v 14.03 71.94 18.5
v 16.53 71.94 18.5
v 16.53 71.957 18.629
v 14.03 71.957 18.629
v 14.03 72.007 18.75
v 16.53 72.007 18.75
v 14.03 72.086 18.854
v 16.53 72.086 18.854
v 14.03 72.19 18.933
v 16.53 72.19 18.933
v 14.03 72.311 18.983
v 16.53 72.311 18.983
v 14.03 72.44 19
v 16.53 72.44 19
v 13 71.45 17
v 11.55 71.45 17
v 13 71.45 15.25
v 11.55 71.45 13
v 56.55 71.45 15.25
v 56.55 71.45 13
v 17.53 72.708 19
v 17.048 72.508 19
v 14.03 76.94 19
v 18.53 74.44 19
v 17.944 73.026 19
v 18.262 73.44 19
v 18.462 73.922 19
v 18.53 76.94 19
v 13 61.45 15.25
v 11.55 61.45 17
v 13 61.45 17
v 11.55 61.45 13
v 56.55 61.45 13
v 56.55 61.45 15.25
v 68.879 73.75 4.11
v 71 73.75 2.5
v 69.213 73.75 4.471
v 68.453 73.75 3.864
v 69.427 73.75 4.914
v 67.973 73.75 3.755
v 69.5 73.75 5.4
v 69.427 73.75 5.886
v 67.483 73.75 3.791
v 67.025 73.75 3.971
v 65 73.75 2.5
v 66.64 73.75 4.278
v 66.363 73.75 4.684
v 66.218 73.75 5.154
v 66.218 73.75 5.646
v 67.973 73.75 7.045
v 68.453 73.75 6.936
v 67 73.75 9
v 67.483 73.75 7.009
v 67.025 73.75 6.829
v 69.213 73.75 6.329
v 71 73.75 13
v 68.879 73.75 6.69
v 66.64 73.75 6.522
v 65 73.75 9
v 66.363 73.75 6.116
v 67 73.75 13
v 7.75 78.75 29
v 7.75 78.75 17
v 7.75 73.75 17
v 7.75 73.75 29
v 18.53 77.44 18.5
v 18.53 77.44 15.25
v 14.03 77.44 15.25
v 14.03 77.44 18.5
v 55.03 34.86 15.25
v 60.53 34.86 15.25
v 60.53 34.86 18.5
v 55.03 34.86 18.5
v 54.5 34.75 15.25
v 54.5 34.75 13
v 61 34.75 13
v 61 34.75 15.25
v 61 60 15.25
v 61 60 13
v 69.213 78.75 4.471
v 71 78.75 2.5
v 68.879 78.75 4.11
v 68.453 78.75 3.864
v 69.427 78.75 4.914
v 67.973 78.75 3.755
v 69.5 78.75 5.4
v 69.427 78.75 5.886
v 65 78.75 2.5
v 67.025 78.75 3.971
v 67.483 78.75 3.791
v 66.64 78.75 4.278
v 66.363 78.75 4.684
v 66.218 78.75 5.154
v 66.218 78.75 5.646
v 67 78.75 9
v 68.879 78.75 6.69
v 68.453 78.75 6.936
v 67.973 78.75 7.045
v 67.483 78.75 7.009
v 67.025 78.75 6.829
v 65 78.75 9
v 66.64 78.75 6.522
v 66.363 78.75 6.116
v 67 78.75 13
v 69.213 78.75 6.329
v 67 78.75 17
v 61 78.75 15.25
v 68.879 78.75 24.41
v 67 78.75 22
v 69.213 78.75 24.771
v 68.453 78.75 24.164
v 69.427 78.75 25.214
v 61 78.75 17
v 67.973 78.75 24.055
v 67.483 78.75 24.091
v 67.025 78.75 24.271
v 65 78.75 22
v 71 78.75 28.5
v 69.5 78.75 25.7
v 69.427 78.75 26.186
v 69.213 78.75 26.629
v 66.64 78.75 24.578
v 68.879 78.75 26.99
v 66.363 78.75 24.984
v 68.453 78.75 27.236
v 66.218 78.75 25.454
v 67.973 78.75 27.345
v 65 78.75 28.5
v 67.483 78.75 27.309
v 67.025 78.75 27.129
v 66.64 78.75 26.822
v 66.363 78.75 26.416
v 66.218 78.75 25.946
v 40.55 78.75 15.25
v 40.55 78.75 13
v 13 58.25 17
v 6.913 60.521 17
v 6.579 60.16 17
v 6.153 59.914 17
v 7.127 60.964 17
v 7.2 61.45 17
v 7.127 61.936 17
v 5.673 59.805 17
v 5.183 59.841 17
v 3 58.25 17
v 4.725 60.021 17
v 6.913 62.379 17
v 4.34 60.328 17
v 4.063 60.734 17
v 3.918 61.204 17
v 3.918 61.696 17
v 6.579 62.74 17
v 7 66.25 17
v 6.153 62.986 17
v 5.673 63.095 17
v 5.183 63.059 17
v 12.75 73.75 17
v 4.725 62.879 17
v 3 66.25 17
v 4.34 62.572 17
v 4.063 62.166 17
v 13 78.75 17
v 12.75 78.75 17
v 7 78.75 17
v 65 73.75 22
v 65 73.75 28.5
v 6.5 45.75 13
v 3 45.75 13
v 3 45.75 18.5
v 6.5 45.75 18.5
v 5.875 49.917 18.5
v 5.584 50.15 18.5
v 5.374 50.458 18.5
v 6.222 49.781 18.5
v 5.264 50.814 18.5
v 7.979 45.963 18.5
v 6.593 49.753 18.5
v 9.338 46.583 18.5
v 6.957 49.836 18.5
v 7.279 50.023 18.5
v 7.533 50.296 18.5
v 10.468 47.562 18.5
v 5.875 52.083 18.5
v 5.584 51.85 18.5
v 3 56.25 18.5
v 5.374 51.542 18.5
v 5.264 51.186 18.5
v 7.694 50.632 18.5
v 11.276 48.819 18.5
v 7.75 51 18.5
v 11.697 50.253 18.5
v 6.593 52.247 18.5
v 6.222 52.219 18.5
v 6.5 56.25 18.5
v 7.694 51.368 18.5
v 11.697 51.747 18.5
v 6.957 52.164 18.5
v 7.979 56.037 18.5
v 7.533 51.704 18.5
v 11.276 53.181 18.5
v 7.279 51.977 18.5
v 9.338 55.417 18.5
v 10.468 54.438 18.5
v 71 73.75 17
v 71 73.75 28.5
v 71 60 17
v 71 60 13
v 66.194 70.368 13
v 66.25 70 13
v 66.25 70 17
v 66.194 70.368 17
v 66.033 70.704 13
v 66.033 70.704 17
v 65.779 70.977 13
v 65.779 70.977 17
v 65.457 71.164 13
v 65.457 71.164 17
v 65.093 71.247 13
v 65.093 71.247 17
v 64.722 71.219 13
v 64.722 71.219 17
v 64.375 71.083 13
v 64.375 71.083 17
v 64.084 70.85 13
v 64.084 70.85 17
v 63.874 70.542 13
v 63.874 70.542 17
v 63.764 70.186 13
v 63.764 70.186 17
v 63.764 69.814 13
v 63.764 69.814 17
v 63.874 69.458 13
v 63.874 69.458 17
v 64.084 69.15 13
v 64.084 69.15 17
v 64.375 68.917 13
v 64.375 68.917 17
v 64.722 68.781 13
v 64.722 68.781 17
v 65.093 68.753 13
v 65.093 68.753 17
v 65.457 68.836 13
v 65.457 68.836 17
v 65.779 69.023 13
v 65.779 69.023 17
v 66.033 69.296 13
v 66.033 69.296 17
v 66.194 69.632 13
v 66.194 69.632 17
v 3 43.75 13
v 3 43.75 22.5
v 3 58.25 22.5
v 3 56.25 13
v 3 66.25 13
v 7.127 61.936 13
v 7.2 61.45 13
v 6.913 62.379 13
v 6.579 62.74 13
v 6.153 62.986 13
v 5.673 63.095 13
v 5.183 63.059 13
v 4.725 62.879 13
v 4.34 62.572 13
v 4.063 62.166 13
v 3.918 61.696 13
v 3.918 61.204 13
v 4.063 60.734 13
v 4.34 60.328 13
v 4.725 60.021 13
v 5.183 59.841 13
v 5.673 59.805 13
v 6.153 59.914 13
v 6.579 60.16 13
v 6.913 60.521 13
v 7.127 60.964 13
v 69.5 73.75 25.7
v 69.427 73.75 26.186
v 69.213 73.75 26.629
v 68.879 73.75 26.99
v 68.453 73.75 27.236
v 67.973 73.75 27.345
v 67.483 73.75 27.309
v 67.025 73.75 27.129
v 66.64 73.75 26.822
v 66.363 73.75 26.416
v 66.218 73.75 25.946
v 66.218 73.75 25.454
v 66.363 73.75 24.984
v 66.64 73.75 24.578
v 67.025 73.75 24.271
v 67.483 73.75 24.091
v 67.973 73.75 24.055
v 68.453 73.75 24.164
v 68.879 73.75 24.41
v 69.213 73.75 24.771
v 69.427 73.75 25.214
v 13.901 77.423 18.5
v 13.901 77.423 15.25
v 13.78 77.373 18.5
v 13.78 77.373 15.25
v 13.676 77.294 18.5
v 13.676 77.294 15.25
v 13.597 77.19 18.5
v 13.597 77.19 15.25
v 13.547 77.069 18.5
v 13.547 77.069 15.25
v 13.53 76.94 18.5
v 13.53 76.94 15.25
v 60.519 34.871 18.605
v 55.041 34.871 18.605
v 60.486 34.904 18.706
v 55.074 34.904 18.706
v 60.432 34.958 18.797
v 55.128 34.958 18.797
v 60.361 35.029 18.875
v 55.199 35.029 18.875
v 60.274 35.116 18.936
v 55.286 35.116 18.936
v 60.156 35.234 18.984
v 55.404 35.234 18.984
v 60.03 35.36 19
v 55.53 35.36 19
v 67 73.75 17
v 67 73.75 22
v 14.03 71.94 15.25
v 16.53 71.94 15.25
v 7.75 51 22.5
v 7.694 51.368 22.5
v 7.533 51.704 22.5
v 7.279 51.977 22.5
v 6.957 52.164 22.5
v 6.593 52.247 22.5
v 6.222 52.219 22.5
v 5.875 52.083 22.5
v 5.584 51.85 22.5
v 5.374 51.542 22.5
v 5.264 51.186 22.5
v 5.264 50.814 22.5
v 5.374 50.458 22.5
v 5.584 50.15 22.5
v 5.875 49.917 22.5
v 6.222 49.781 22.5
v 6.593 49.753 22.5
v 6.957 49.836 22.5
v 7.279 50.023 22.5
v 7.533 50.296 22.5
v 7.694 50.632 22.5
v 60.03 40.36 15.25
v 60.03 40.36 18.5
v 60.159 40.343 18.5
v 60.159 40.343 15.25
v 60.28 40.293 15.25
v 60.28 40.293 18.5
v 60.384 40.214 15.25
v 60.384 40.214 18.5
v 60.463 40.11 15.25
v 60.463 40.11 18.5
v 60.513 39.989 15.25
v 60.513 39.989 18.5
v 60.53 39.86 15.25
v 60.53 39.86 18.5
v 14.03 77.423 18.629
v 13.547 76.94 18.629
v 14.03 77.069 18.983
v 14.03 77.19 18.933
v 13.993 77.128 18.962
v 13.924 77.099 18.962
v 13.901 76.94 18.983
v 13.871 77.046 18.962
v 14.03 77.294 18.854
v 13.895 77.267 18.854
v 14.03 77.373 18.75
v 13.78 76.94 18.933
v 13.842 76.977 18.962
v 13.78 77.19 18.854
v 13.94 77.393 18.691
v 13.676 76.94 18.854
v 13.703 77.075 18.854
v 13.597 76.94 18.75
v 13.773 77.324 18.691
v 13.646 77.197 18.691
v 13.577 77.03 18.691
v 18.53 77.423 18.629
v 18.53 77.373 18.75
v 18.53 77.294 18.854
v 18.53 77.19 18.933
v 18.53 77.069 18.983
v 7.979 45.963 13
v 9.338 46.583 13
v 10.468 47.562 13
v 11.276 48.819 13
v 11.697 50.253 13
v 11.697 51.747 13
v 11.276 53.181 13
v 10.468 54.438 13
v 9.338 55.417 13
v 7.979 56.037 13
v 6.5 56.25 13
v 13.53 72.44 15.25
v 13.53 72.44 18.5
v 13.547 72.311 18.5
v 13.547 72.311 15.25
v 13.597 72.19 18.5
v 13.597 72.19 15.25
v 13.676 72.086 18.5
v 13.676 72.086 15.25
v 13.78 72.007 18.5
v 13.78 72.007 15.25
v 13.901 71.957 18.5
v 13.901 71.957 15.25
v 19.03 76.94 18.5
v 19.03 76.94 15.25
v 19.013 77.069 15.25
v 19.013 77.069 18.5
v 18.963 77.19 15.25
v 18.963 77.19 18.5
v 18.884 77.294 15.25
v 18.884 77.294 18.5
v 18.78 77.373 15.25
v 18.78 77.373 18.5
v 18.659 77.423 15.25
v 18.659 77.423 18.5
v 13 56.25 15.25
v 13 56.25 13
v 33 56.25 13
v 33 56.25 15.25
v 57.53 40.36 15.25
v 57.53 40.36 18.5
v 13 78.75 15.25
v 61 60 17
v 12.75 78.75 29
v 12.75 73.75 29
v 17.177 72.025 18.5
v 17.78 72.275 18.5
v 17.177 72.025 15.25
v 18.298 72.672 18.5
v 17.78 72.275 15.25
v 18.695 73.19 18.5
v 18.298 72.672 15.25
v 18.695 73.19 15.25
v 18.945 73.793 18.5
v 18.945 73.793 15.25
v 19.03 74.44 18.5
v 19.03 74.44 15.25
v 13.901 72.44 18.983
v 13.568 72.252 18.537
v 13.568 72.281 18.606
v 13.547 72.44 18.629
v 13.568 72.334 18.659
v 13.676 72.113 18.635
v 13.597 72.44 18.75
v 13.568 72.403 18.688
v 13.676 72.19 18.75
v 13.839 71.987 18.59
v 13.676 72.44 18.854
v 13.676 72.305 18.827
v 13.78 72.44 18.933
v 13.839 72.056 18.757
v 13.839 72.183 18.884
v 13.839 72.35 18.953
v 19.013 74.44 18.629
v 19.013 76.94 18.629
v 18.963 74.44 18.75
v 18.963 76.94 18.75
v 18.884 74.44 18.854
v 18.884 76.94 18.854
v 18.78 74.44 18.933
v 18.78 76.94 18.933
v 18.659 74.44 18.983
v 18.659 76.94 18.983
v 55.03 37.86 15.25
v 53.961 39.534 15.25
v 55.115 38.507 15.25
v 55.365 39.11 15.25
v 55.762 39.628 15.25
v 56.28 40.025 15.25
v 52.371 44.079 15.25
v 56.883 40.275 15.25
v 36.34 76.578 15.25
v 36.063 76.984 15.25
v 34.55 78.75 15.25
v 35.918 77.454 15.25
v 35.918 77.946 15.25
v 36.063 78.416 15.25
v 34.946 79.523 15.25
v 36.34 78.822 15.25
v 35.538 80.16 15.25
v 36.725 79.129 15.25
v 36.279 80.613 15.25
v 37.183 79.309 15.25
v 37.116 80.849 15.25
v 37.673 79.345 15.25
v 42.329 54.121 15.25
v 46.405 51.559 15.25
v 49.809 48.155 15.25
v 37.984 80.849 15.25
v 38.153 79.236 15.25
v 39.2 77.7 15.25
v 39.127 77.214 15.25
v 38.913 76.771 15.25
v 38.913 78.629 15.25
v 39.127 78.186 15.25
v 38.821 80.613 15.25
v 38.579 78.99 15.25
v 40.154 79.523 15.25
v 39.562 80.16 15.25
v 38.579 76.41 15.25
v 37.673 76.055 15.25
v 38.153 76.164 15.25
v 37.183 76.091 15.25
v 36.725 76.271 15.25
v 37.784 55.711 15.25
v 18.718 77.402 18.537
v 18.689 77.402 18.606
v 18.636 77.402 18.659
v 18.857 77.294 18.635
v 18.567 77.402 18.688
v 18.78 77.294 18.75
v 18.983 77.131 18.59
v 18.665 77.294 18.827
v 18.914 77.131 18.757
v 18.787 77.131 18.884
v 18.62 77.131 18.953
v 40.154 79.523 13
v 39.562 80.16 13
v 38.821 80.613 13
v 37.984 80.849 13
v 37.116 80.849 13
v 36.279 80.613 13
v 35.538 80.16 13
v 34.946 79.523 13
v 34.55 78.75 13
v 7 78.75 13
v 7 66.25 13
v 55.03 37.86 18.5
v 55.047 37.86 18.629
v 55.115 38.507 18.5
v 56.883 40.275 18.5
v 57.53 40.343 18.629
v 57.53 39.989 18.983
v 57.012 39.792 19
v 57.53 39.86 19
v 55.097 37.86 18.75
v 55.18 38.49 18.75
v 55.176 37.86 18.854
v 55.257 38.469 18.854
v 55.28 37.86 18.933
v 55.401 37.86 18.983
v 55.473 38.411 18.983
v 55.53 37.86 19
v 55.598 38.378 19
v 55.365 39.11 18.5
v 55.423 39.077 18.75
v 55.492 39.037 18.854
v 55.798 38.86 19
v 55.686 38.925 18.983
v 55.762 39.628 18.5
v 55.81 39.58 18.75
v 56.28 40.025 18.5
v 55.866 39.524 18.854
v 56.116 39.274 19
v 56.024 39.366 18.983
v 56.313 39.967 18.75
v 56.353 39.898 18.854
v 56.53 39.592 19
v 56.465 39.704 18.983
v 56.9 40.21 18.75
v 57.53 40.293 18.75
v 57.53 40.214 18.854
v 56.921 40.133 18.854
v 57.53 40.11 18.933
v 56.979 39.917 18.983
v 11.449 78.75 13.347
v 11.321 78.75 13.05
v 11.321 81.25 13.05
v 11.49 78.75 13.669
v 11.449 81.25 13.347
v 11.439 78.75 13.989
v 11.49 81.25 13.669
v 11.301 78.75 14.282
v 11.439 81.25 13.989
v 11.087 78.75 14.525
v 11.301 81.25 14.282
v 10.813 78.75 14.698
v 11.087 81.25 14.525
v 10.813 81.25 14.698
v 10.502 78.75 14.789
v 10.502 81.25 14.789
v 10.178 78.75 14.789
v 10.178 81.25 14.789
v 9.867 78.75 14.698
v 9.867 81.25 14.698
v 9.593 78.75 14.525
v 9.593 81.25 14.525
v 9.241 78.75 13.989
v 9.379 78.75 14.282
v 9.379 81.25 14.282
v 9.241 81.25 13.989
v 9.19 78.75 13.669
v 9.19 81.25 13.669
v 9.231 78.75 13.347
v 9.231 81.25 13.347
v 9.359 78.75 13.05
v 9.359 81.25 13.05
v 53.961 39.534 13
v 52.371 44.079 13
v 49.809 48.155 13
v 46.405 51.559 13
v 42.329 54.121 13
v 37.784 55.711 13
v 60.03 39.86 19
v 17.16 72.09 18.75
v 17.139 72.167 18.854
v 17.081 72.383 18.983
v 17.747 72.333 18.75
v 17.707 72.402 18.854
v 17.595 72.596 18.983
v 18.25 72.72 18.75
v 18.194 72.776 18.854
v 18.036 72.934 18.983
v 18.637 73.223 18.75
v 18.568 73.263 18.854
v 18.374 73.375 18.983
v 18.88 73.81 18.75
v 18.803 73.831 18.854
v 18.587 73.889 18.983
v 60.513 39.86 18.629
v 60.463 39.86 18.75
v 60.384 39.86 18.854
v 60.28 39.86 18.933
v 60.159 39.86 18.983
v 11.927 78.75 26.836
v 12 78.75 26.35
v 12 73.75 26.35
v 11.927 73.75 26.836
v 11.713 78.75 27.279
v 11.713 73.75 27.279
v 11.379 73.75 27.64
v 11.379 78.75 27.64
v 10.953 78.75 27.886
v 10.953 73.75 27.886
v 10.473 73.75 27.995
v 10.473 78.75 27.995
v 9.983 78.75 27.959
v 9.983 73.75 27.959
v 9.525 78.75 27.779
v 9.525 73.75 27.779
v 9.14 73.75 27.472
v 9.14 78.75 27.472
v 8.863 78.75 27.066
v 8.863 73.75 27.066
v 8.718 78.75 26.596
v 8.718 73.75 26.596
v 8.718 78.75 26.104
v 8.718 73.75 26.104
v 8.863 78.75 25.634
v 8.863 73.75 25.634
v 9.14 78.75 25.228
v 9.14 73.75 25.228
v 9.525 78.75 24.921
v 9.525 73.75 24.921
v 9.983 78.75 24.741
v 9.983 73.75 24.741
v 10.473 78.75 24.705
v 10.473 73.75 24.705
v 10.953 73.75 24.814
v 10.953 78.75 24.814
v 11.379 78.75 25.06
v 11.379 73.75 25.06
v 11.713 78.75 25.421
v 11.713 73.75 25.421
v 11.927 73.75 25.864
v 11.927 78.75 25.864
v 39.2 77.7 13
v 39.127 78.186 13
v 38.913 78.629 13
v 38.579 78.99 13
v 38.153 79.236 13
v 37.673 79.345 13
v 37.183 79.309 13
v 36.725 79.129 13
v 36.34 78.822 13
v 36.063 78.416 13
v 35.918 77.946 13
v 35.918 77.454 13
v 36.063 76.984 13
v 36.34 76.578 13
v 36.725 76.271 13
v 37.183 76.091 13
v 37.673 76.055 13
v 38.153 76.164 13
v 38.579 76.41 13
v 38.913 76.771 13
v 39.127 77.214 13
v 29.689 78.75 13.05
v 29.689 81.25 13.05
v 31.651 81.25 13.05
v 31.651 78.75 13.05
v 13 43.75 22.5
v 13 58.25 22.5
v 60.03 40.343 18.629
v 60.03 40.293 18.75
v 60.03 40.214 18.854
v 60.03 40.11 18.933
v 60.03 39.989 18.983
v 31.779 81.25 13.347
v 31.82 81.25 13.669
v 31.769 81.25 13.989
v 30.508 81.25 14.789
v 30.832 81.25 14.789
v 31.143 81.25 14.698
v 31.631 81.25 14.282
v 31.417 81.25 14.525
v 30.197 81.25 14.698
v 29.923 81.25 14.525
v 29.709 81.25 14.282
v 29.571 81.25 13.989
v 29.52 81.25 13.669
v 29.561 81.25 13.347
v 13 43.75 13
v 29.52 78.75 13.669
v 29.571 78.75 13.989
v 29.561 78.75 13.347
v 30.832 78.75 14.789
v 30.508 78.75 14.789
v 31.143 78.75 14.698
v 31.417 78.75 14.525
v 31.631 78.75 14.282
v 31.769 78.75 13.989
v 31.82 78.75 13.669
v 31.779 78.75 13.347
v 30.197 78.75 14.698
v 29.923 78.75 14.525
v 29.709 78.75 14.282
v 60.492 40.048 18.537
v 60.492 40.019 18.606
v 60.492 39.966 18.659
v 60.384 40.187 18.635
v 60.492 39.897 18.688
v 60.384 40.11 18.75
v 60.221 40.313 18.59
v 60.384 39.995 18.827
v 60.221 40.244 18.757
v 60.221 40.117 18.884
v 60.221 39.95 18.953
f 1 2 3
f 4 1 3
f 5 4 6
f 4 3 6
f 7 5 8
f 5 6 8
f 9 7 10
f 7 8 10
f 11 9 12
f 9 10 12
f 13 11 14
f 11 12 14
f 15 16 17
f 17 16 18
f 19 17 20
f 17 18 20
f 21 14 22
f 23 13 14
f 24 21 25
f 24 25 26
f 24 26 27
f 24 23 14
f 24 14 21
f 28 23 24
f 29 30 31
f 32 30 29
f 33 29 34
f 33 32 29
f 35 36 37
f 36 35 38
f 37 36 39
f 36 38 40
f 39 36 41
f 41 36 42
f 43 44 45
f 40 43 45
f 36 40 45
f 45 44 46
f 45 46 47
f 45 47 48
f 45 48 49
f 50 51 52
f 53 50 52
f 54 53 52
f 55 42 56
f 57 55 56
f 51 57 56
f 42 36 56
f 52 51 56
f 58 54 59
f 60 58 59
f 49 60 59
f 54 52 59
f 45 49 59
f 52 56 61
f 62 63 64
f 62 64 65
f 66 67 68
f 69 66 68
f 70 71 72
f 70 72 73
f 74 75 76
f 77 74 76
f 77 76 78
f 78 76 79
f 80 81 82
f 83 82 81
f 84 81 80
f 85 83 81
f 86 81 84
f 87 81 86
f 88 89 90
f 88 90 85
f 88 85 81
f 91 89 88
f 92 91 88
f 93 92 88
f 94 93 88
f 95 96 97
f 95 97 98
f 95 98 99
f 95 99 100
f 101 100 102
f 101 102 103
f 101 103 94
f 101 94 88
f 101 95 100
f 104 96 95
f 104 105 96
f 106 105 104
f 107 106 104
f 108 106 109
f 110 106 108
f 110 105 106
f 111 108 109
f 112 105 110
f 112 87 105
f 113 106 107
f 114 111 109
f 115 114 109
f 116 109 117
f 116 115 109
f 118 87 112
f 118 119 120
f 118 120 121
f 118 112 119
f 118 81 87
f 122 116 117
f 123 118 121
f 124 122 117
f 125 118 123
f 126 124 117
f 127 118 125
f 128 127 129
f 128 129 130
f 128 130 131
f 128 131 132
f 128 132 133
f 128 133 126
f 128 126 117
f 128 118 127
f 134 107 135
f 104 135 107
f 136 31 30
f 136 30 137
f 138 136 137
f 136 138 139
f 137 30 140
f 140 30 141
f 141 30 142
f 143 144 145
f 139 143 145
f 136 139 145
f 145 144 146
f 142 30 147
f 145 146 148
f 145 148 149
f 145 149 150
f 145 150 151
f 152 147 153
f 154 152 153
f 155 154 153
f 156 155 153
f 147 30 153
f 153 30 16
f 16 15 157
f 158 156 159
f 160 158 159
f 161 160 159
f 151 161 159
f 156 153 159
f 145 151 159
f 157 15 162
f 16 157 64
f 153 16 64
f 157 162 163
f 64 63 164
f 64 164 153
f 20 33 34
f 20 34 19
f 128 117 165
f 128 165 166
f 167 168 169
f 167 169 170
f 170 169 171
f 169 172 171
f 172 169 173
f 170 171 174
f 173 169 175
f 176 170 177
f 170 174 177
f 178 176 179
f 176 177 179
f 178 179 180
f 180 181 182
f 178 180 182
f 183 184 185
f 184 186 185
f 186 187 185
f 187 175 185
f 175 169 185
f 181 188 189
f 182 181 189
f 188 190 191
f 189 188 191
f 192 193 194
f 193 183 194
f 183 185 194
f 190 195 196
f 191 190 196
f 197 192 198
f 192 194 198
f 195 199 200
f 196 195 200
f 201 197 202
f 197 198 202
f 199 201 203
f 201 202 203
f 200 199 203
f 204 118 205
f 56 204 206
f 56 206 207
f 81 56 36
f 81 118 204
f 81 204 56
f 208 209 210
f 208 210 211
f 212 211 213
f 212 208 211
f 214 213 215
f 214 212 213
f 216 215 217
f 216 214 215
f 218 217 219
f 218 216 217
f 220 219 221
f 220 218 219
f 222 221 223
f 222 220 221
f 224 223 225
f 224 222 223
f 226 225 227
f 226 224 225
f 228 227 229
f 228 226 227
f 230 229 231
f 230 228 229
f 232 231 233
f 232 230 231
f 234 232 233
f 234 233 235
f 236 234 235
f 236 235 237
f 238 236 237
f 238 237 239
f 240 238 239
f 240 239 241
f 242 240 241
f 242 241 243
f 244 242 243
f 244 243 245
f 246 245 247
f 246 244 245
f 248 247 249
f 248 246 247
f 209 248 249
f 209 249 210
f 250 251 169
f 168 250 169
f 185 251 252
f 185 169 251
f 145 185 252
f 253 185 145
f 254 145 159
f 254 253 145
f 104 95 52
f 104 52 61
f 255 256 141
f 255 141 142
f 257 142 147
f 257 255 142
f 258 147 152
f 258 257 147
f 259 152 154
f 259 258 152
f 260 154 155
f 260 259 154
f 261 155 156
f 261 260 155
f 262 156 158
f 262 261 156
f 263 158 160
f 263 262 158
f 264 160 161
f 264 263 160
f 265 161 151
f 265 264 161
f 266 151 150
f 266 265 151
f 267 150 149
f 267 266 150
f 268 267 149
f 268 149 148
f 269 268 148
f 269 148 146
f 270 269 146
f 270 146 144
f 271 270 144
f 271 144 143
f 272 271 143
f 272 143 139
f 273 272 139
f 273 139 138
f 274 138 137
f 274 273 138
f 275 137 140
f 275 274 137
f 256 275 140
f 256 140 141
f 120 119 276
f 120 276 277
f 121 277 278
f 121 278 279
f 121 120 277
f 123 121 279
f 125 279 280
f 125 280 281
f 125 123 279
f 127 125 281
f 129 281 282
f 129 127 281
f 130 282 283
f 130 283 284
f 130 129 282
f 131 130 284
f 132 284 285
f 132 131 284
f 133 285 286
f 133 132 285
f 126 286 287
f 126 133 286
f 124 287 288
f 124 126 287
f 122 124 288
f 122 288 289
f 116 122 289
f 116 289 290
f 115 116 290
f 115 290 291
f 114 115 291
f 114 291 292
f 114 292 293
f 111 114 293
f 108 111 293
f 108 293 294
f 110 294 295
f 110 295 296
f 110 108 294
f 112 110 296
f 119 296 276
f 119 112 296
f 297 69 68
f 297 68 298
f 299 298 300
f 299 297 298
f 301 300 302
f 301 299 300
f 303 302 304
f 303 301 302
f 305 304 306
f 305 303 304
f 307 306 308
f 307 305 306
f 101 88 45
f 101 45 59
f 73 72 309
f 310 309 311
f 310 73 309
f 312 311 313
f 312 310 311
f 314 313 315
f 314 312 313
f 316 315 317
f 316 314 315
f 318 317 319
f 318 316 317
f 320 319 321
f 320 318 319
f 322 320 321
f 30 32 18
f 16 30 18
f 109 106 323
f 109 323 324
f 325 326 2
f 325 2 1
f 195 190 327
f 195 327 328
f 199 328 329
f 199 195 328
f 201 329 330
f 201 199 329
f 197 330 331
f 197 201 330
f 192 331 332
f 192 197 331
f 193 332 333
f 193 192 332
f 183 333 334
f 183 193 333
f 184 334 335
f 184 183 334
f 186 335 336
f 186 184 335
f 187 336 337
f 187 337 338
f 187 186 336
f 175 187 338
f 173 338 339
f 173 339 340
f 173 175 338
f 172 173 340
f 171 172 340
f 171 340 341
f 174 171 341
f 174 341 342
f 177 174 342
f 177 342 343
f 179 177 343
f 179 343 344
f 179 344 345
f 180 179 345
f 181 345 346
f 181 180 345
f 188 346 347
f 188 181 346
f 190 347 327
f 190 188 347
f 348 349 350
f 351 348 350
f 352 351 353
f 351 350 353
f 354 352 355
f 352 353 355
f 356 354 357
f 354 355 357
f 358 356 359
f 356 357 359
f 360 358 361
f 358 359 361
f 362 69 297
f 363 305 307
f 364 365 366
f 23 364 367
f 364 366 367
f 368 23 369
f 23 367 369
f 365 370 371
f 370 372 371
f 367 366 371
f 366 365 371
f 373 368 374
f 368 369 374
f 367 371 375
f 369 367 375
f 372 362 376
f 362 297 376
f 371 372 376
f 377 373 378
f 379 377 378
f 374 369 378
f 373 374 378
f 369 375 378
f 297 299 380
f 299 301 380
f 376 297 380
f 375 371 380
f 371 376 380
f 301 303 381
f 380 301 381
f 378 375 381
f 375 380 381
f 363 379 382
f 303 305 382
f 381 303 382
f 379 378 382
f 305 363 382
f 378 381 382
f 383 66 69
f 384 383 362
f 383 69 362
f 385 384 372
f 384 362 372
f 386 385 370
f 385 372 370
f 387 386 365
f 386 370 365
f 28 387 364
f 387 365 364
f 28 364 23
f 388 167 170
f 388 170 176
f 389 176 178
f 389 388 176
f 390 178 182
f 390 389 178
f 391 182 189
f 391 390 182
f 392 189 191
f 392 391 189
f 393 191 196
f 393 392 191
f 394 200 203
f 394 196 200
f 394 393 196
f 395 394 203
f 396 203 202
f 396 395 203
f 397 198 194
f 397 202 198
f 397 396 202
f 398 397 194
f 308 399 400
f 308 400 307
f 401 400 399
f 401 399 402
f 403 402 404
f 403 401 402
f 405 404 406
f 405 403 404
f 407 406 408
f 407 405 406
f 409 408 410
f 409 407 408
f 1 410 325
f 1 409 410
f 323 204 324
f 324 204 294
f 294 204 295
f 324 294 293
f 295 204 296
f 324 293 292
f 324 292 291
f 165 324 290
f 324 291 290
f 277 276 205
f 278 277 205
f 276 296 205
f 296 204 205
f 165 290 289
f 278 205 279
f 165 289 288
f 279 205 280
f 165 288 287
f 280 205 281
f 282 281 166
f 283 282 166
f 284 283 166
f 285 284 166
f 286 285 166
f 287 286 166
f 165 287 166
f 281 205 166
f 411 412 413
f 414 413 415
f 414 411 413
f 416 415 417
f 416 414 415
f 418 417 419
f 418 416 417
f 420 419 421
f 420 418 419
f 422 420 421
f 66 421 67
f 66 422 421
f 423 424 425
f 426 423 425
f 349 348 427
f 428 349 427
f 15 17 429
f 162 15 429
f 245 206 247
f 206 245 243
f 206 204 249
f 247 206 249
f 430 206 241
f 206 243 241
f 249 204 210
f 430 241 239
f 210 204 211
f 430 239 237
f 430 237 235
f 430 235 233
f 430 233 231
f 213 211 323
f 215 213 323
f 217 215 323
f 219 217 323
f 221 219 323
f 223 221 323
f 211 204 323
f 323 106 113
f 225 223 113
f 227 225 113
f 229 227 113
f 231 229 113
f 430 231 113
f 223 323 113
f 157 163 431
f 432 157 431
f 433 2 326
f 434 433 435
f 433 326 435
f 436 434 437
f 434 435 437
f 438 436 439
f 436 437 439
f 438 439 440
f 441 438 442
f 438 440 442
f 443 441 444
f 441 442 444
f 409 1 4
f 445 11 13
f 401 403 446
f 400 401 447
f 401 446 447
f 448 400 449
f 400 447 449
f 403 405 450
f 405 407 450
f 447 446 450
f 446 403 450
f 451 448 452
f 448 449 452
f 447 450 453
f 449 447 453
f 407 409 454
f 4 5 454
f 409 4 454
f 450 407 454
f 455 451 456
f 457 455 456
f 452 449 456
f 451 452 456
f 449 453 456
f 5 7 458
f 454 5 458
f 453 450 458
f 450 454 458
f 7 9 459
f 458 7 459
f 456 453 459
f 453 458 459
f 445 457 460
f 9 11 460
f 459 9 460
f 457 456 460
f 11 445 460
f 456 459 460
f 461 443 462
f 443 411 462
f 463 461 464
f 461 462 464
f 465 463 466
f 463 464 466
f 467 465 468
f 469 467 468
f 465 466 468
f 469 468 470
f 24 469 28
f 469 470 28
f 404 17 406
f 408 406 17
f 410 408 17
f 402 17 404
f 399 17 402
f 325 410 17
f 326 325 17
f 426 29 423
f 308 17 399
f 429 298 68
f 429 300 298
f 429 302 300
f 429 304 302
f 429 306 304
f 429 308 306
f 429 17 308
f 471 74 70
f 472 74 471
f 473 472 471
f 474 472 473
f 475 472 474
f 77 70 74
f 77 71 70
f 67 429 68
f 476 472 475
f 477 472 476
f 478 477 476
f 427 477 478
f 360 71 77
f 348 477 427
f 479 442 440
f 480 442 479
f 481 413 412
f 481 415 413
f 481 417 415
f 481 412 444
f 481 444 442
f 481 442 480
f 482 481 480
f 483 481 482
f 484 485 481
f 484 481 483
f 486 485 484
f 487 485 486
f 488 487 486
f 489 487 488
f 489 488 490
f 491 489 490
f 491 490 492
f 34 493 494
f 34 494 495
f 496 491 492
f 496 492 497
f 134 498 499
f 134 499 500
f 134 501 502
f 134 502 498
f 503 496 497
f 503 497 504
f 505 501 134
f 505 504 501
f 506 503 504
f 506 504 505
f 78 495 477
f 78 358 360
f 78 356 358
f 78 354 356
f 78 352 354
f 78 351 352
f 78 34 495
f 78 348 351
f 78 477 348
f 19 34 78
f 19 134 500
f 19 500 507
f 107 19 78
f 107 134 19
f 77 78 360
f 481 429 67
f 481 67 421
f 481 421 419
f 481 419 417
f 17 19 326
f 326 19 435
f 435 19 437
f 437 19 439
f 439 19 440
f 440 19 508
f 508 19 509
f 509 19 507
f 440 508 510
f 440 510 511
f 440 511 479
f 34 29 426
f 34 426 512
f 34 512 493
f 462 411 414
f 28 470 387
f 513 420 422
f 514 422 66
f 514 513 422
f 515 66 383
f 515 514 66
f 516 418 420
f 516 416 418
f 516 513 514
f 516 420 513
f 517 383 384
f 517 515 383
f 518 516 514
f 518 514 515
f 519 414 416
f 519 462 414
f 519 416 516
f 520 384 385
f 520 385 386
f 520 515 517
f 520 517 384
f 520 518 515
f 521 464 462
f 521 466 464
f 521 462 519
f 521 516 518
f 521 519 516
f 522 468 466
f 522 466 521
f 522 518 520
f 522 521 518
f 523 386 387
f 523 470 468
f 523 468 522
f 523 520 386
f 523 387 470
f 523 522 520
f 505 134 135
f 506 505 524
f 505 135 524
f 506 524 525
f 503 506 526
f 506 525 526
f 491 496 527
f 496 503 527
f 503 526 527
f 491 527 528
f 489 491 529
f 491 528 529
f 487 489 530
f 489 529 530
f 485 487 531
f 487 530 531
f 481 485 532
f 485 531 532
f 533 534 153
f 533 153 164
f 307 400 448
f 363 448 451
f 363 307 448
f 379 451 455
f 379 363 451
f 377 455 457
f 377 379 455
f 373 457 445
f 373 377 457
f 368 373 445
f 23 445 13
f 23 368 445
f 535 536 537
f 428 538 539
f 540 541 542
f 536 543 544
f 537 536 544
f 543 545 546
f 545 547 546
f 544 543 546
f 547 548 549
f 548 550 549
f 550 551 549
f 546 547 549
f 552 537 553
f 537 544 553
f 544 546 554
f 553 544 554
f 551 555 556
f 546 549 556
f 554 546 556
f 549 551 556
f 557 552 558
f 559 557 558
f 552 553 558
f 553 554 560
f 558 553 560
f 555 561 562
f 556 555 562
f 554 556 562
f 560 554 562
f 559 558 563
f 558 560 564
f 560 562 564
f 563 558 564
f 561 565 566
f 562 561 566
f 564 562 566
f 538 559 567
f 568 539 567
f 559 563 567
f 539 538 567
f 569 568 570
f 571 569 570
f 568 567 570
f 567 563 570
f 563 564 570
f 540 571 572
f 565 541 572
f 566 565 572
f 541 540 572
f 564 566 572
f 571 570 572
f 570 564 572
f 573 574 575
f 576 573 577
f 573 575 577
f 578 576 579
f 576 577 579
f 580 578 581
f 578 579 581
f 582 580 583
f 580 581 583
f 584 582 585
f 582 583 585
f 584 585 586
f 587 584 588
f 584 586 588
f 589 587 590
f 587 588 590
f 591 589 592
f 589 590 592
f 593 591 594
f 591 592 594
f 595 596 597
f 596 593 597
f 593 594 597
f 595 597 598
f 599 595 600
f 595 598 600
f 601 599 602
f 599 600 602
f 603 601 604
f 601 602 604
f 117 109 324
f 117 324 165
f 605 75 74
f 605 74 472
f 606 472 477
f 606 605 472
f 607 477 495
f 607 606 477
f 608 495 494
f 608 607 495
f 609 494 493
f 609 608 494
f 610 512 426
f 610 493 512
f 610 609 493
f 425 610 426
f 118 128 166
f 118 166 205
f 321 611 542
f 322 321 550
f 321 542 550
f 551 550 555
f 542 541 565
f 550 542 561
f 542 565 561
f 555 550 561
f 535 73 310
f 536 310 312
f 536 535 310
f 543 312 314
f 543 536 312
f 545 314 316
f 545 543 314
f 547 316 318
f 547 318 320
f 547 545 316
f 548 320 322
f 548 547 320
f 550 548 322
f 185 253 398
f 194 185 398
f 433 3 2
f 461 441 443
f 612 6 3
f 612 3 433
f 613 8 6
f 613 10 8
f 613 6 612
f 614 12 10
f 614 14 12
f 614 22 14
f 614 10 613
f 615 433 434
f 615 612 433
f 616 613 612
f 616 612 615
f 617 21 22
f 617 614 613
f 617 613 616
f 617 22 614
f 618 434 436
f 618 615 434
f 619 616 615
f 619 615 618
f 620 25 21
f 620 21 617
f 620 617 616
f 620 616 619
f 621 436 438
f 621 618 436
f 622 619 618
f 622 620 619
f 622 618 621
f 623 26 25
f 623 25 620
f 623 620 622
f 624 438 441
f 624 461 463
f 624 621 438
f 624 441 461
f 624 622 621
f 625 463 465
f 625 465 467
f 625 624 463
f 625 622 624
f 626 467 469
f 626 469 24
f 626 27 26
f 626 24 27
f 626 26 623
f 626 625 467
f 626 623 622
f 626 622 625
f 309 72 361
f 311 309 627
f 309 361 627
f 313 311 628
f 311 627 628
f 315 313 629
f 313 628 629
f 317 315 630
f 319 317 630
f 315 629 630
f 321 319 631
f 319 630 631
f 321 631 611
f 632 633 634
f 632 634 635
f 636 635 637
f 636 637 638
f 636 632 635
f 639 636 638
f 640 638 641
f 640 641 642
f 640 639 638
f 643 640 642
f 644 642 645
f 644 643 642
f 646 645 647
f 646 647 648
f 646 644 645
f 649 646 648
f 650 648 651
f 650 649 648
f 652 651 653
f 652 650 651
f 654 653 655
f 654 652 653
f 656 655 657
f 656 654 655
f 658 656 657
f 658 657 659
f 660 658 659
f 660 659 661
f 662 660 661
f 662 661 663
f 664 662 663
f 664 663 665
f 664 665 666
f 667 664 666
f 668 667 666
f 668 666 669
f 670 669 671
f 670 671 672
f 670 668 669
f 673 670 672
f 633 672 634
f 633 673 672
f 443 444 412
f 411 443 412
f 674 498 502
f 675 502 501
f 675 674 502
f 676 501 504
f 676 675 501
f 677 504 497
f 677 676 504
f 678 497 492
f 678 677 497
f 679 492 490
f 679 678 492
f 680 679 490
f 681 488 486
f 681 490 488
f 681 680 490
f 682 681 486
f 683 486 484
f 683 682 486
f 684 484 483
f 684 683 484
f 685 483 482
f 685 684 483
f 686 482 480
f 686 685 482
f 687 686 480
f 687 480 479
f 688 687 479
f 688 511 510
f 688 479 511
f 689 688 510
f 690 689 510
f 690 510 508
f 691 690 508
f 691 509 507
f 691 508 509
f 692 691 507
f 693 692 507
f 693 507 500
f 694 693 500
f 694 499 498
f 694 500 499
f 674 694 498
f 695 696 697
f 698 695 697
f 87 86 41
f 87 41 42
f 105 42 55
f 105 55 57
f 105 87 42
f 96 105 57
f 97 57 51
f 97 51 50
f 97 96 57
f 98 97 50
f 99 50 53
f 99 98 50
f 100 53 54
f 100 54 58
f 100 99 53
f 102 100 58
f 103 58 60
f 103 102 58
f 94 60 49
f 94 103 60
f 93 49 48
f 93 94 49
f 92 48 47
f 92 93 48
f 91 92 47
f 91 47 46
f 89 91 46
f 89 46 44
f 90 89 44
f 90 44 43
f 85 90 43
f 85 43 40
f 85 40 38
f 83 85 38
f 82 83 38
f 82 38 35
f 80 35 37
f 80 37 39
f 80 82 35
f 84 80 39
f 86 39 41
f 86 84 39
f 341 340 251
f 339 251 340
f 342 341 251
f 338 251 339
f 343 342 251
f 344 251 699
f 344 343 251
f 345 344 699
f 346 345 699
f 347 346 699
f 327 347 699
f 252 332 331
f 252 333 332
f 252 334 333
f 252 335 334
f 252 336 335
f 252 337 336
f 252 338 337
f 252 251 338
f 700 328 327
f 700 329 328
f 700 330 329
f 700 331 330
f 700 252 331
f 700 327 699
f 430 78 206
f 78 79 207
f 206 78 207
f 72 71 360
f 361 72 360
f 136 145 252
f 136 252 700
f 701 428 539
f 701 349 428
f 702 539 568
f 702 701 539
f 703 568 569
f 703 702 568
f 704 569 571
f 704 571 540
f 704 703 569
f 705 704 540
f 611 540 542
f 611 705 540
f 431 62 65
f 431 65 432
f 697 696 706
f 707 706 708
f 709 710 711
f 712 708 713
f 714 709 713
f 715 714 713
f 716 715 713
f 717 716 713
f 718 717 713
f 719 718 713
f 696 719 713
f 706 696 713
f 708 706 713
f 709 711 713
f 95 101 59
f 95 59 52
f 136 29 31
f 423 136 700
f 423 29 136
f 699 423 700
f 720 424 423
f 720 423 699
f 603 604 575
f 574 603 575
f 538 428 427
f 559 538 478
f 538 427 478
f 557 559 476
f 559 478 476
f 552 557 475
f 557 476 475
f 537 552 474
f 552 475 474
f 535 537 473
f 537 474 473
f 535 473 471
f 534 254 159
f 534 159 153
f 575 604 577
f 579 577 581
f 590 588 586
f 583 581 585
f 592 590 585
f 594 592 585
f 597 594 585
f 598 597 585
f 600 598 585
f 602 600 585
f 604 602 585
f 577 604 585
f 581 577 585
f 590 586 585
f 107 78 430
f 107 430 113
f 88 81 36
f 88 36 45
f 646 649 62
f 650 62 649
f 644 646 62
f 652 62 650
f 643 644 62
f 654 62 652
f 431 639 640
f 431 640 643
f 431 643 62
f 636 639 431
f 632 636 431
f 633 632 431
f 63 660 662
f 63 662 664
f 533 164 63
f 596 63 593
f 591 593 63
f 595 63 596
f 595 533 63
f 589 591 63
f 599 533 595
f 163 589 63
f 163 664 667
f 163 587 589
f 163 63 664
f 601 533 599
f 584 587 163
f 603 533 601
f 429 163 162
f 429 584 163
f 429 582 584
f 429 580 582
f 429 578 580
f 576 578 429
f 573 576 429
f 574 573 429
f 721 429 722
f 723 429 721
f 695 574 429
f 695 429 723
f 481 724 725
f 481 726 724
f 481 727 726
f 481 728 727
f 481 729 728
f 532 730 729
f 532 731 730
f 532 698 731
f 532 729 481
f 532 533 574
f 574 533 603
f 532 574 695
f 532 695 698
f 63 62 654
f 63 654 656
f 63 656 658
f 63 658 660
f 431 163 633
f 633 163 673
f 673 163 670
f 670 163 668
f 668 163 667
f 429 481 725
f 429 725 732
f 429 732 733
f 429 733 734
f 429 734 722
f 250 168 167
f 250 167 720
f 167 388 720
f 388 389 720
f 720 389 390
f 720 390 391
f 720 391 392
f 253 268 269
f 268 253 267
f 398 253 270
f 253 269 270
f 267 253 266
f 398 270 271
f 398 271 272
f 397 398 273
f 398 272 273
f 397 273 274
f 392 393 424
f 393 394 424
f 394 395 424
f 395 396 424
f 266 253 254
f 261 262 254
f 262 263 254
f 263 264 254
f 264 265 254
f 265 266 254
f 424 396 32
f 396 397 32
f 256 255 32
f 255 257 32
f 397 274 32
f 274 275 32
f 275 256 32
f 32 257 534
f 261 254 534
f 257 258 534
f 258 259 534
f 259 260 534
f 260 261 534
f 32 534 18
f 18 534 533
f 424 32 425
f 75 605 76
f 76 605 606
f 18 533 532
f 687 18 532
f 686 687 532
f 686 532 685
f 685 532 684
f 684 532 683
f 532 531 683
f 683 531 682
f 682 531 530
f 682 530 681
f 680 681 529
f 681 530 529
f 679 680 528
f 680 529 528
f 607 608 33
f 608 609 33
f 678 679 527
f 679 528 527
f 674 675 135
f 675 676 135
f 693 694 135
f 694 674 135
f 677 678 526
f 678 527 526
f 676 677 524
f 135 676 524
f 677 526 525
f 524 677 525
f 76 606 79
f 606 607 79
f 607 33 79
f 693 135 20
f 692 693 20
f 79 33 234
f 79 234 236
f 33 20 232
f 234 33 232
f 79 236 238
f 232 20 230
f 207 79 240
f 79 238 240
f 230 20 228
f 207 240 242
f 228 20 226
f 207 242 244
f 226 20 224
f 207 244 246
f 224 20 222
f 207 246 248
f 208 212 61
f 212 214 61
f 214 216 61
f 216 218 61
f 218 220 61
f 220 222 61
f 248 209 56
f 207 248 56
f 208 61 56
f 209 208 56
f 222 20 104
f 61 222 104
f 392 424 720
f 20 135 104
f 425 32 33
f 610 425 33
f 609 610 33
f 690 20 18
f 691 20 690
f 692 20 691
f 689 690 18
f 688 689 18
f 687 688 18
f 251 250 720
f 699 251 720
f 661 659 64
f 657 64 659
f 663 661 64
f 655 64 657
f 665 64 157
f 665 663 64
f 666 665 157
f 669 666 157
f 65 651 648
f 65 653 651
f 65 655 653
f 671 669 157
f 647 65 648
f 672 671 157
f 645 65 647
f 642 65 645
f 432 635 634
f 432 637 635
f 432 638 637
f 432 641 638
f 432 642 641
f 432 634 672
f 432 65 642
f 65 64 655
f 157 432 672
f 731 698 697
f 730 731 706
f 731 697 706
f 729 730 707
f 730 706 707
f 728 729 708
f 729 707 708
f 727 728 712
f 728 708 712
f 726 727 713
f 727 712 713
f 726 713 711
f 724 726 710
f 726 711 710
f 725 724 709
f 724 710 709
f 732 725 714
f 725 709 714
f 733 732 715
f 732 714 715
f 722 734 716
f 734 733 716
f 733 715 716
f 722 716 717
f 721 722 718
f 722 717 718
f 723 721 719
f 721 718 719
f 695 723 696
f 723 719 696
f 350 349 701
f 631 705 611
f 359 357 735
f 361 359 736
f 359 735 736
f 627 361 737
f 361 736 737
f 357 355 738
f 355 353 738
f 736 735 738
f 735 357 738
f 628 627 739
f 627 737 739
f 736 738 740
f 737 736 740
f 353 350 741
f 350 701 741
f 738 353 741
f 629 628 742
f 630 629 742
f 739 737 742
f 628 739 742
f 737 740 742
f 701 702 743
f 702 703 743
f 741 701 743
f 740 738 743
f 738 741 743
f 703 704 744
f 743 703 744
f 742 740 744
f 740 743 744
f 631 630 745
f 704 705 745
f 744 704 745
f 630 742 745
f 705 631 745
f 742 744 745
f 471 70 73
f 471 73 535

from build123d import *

# Parameters (mm, degrees)
SKETCH021_R      = 1.65
EXTRUDE021_DEPTH = 5
EXTRUDE001_DEPTH = 4
FILLET003_R      = 0.5
BOX005_W         = 48
BOX005_H         = 47
BOX005_DEPTH     = 10
EXTRUDE037_DEPTH = 6
SKETCH038_W      = 10
SKETCH038_H      = 14.5
SKETCH038_R      = 1.25
EXTRUDE038_DEPTH = 4
SKETCH039_W      = 5
SKETCH039_H      = 16
SKETCH039_R      = 1.65
EXTRUDE039_DEPTH = 5
EXTRUDE040_DEPTH = 3
SKETCH020_R      = 1.65
SKETCH020_R_2    = 1.25
SKETCH020_W      = 45
SKETCH020_H      = 10
EXTRUDE036_DEPTH = 4


with BuildPart() as gpshold:
    # Sketch021 → Extrude021 (new body)
    with BuildSketch(Plane.XZ):
        Polygon((65, 28.5), (71, 28.5), (71, 2.5), (65, 2.5), (65, 9), (67, 9), (67, 22), (65, 22), align=None)
        with Locations((67.85, 25.7)):
            Circle(SKETCH021_R, mode=Mode.SUBTRACT)
        with Locations((67.85, 5.4)):
            Circle(SKETCH021_R, mode=Mode.SUBTRACT)
    extrude(amount=EXTRUDE021_DEPTH)


with BuildPart() as gpshold_1:
    # Extrude021 placement: moved
    add(gpshold.part.moved(Location((0, 78.75, 0))))


with BuildPart() as ipsholdbottomindone:
    # Sketch001 → Extrude001 (new body)
    with BuildSketch(Plane.XY):
        with BuildLine():
            Line((19.03, 74.44), (19.03, 77.44))
            Line((19.03, 77.44), (13.53, 77.44))
            Line((13.53, 71.94), (13.53, 77.44))
            Line((16.53, 71.94), (13.53, 71.94))
            ThreePointArc((16.53, 71.94), (18.297767, 72.672233), (19.03, 74.44))
        make_face()
        with BuildLine():
            Line((60.53, 34.86), (55.03, 34.86))
            Line((55.03, 34.86), (55.03, 37.86))
            ThreePointArc((57.53, 40.36), (55.762233, 39.627767), (55.03, 37.86))
            Line((60.53, 40.36), (57.53, 40.36))
            Line((60.53, 34.86), (60.53, 40.36))
        make_face()
    extrude(amount=EXTRUDE001_DEPTH)


with BuildPart() as ipsholdbottomindone_1:
    # Extrude001 placement: moved
    add(ipsholdbottomindone.part.moved(Location((0, 0, 2))))

    # Fillet003
    fillet003_edges = [ipsholdbottomindone_1.edges().sort_by_distance(p)[0] for p in [
        (57.78, 34.86, 6),
        (55.03, 36.36, 6),
        (55.762233, 39.627767, 6),
        (60.53, 40.36, 4),
        (59.03, 40.36, 6),
        (60.53, 37.61, 6),
        (18.297767, 72.672233, 6),
        (19.03, 77.44, 4),
        (19.03, 75.94, 6),
        (13.53, 77.44, 4),
        (16.28, 77.44, 6),
        (13.53, 71.94, 4),
        (13.53, 74.69, 6),
        (15.03, 71.94, 6),
    ]]
    fillet(fillet003_edges, radius=FILLET003_R)


with BuildPart() as ipsholdbottomindone_2:
    # Fillet003 placement: moved
    add(ipsholdbottomindone_1.part.moved(Location((0, 0, 13))))


with BuildPart() as sensorholdipscut:
    # Box005 → Box005 (new body)
    with BuildSketch(Plane(origin=(13, 34, 15.25), x_dir=(1, 0, 0), z_dir=(0, 0, 1))):
        with Locations((24, 23.5)):
            Rectangle(BOX005_W, BOX005_H)
    extrude(amount=BOX005_DEPTH)


with BuildPart() as sensorholdaddon:
    # Sketch037 → Extrude037 (new body)
    with BuildSketch(Plane.XY.offset(17)):
        with BuildLine():
            Line((3, 58.25), (13, 58.25))
            Line((13, 58.25), (13, 43.75))
            Line((13, 43.75), (3, 43.75))
            Line((3, 43.75), (3, 45.75))
            Line((3, 45.75), (6.5, 45.75))
            ThreePointArc((6.5, 45.75), (11.75, 51), (6.5, 56.25))
            Line((3, 56.25), (6.5, 56.25))
            Line((3, 58.25), (3, 56.25))
        make_face()
    extrude(amount=EXTRUDE037_DEPTH)


with BuildPart() as sensorholdaddon_1:
    # Extrude037 placement: moved
    add(sensorholdaddon.part.moved(Location((0, 0, -4))))


with BuildPart() as sensorholdaddon001:
    # Sketch038 → Extrude038 (new body)
    with BuildSketch(Plane.XY.offset(17)):
        with Locations((8, 51)):
            Rectangle(SKETCH038_W, SKETCH038_H)
        with Locations((6.5, 51)):
            Circle(SKETCH038_R, mode=Mode.SUBTRACT)
    extrude(amount=EXTRUDE038_DEPTH)


with BuildPart() as sensorholdaddon001_1:
    # Extrude038 placement: moved
    add(sensorholdaddon001.part.moved(Location((0, 0, 1.5))))


with BuildPart() as bmehold:
    # Sketch039 → Extrude039 (new body)
    with BuildSketch(Plane.XZ.offset(-78.75)):
        with Locations((10.25, 21)):
            Rectangle(SKETCH039_W, SKETCH039_H)
        with Locations((10.35, 26.35)):
            Circle(SKETCH039_R, mode=Mode.SUBTRACT)
    extrude(amount=EXTRUDE039_DEPTH)


with BuildPart() as bmehold001:
    # Sketch040 → Extrude040 (new body)
    with BuildSketch(Plane.XZ.offset(-78.75)):
        with BuildLine():
            ThreePointArc((11.321071, 13.05), (10.34, 14.8), (9.358929, 13.05))
            Line((9.358929, 13.05), (11.321071, 13.05))
        make_face()
        with BuildLine():
            ThreePointArc((31.651071, 13.05), (30.67, 14.8), (29.688929, 13.05))
            Line((29.688929, 13.05), (31.651071, 13.05))
        make_face()
    extrude(amount=EXTRUDE040_DEPTH)


with BuildPart() as bmehold001_1:
    # Extrude040 placement: moved
    add(bmehold001.part.moved(Location((0, 2.5, 0))))


with BuildPart() as sensorhold005:
    # Sketch020 → Extrude036 (new body)
    with BuildSketch(Plane.XY):
        with BuildLine():
            Line((71, 78.75), (71, 60))
            Line((61, 60), (71, 60))
            Line((61, 34.75), (61, 60))
            Line((61, 34.75), (61, 60))
            Line((61, 34.75), (61, 60))
            Line((54.5, 34.75), (61, 34.75))
            ThreePointArc((54.5, 34.75), (48.202796, 49.952796), (33, 56.25))
            Line((3, 56.25), (33, 56.25))
            Line((3, 56.25), (3, 66.25))
            Line((3, 66.25), (7, 66.25))
            Line((7, 66.25), (7, 78.75))
            Line((7, 78.75), (34.55, 78.75))
            ThreePointArc((40.55, 78.75), (37.55, 80.878443), (34.55, 78.75))
            Line((40.55, 78.75), (71, 78.75))
        make_face()
        with Locations((5.55, 61.45)):
            Circle(SKETCH020_R, mode=Mode.SUBTRACT)
        with Locations((37.55, 77.7)):
            Circle(SKETCH020_R, mode=Mode.SUBTRACT)
        with Locations((65, 70)):
            Circle(SKETCH020_R_2, mode=Mode.SUBTRACT)
        with Locations((34.05, 66.45)):
            Rectangle(SKETCH020_W, SKETCH020_H, mode=Mode.SUBTRACT)
    extrude(amount=EXTRUDE036_DEPTH)


with BuildPart() as sensorhold005_1:
    # Extrude036 placement: moved
    add(sensorhold005.part.moved(Location((0, 0, 13))))

    # Fusion034: union sensorHoldAddon, sensorHoldAddon001, bmeHold, bmeHold001
    add(sensorholdaddon_1.part)
    add(sensorholdaddon001_1.part)
    add(bmehold.part)
    add(bmehold001_1.part)

    # Cut016: cut sensorHoldIPSCut
    add(sensorholdipscut.part, mode=Mode.SUBTRACT)

    # Fusion035: union ipsHoldBottomInDone
    add(ipsholdbottomindone_2.part)

    # Fusion036: union gpsHold
    add(gpshold_1.part)


solid = sensorhold005_1.part
